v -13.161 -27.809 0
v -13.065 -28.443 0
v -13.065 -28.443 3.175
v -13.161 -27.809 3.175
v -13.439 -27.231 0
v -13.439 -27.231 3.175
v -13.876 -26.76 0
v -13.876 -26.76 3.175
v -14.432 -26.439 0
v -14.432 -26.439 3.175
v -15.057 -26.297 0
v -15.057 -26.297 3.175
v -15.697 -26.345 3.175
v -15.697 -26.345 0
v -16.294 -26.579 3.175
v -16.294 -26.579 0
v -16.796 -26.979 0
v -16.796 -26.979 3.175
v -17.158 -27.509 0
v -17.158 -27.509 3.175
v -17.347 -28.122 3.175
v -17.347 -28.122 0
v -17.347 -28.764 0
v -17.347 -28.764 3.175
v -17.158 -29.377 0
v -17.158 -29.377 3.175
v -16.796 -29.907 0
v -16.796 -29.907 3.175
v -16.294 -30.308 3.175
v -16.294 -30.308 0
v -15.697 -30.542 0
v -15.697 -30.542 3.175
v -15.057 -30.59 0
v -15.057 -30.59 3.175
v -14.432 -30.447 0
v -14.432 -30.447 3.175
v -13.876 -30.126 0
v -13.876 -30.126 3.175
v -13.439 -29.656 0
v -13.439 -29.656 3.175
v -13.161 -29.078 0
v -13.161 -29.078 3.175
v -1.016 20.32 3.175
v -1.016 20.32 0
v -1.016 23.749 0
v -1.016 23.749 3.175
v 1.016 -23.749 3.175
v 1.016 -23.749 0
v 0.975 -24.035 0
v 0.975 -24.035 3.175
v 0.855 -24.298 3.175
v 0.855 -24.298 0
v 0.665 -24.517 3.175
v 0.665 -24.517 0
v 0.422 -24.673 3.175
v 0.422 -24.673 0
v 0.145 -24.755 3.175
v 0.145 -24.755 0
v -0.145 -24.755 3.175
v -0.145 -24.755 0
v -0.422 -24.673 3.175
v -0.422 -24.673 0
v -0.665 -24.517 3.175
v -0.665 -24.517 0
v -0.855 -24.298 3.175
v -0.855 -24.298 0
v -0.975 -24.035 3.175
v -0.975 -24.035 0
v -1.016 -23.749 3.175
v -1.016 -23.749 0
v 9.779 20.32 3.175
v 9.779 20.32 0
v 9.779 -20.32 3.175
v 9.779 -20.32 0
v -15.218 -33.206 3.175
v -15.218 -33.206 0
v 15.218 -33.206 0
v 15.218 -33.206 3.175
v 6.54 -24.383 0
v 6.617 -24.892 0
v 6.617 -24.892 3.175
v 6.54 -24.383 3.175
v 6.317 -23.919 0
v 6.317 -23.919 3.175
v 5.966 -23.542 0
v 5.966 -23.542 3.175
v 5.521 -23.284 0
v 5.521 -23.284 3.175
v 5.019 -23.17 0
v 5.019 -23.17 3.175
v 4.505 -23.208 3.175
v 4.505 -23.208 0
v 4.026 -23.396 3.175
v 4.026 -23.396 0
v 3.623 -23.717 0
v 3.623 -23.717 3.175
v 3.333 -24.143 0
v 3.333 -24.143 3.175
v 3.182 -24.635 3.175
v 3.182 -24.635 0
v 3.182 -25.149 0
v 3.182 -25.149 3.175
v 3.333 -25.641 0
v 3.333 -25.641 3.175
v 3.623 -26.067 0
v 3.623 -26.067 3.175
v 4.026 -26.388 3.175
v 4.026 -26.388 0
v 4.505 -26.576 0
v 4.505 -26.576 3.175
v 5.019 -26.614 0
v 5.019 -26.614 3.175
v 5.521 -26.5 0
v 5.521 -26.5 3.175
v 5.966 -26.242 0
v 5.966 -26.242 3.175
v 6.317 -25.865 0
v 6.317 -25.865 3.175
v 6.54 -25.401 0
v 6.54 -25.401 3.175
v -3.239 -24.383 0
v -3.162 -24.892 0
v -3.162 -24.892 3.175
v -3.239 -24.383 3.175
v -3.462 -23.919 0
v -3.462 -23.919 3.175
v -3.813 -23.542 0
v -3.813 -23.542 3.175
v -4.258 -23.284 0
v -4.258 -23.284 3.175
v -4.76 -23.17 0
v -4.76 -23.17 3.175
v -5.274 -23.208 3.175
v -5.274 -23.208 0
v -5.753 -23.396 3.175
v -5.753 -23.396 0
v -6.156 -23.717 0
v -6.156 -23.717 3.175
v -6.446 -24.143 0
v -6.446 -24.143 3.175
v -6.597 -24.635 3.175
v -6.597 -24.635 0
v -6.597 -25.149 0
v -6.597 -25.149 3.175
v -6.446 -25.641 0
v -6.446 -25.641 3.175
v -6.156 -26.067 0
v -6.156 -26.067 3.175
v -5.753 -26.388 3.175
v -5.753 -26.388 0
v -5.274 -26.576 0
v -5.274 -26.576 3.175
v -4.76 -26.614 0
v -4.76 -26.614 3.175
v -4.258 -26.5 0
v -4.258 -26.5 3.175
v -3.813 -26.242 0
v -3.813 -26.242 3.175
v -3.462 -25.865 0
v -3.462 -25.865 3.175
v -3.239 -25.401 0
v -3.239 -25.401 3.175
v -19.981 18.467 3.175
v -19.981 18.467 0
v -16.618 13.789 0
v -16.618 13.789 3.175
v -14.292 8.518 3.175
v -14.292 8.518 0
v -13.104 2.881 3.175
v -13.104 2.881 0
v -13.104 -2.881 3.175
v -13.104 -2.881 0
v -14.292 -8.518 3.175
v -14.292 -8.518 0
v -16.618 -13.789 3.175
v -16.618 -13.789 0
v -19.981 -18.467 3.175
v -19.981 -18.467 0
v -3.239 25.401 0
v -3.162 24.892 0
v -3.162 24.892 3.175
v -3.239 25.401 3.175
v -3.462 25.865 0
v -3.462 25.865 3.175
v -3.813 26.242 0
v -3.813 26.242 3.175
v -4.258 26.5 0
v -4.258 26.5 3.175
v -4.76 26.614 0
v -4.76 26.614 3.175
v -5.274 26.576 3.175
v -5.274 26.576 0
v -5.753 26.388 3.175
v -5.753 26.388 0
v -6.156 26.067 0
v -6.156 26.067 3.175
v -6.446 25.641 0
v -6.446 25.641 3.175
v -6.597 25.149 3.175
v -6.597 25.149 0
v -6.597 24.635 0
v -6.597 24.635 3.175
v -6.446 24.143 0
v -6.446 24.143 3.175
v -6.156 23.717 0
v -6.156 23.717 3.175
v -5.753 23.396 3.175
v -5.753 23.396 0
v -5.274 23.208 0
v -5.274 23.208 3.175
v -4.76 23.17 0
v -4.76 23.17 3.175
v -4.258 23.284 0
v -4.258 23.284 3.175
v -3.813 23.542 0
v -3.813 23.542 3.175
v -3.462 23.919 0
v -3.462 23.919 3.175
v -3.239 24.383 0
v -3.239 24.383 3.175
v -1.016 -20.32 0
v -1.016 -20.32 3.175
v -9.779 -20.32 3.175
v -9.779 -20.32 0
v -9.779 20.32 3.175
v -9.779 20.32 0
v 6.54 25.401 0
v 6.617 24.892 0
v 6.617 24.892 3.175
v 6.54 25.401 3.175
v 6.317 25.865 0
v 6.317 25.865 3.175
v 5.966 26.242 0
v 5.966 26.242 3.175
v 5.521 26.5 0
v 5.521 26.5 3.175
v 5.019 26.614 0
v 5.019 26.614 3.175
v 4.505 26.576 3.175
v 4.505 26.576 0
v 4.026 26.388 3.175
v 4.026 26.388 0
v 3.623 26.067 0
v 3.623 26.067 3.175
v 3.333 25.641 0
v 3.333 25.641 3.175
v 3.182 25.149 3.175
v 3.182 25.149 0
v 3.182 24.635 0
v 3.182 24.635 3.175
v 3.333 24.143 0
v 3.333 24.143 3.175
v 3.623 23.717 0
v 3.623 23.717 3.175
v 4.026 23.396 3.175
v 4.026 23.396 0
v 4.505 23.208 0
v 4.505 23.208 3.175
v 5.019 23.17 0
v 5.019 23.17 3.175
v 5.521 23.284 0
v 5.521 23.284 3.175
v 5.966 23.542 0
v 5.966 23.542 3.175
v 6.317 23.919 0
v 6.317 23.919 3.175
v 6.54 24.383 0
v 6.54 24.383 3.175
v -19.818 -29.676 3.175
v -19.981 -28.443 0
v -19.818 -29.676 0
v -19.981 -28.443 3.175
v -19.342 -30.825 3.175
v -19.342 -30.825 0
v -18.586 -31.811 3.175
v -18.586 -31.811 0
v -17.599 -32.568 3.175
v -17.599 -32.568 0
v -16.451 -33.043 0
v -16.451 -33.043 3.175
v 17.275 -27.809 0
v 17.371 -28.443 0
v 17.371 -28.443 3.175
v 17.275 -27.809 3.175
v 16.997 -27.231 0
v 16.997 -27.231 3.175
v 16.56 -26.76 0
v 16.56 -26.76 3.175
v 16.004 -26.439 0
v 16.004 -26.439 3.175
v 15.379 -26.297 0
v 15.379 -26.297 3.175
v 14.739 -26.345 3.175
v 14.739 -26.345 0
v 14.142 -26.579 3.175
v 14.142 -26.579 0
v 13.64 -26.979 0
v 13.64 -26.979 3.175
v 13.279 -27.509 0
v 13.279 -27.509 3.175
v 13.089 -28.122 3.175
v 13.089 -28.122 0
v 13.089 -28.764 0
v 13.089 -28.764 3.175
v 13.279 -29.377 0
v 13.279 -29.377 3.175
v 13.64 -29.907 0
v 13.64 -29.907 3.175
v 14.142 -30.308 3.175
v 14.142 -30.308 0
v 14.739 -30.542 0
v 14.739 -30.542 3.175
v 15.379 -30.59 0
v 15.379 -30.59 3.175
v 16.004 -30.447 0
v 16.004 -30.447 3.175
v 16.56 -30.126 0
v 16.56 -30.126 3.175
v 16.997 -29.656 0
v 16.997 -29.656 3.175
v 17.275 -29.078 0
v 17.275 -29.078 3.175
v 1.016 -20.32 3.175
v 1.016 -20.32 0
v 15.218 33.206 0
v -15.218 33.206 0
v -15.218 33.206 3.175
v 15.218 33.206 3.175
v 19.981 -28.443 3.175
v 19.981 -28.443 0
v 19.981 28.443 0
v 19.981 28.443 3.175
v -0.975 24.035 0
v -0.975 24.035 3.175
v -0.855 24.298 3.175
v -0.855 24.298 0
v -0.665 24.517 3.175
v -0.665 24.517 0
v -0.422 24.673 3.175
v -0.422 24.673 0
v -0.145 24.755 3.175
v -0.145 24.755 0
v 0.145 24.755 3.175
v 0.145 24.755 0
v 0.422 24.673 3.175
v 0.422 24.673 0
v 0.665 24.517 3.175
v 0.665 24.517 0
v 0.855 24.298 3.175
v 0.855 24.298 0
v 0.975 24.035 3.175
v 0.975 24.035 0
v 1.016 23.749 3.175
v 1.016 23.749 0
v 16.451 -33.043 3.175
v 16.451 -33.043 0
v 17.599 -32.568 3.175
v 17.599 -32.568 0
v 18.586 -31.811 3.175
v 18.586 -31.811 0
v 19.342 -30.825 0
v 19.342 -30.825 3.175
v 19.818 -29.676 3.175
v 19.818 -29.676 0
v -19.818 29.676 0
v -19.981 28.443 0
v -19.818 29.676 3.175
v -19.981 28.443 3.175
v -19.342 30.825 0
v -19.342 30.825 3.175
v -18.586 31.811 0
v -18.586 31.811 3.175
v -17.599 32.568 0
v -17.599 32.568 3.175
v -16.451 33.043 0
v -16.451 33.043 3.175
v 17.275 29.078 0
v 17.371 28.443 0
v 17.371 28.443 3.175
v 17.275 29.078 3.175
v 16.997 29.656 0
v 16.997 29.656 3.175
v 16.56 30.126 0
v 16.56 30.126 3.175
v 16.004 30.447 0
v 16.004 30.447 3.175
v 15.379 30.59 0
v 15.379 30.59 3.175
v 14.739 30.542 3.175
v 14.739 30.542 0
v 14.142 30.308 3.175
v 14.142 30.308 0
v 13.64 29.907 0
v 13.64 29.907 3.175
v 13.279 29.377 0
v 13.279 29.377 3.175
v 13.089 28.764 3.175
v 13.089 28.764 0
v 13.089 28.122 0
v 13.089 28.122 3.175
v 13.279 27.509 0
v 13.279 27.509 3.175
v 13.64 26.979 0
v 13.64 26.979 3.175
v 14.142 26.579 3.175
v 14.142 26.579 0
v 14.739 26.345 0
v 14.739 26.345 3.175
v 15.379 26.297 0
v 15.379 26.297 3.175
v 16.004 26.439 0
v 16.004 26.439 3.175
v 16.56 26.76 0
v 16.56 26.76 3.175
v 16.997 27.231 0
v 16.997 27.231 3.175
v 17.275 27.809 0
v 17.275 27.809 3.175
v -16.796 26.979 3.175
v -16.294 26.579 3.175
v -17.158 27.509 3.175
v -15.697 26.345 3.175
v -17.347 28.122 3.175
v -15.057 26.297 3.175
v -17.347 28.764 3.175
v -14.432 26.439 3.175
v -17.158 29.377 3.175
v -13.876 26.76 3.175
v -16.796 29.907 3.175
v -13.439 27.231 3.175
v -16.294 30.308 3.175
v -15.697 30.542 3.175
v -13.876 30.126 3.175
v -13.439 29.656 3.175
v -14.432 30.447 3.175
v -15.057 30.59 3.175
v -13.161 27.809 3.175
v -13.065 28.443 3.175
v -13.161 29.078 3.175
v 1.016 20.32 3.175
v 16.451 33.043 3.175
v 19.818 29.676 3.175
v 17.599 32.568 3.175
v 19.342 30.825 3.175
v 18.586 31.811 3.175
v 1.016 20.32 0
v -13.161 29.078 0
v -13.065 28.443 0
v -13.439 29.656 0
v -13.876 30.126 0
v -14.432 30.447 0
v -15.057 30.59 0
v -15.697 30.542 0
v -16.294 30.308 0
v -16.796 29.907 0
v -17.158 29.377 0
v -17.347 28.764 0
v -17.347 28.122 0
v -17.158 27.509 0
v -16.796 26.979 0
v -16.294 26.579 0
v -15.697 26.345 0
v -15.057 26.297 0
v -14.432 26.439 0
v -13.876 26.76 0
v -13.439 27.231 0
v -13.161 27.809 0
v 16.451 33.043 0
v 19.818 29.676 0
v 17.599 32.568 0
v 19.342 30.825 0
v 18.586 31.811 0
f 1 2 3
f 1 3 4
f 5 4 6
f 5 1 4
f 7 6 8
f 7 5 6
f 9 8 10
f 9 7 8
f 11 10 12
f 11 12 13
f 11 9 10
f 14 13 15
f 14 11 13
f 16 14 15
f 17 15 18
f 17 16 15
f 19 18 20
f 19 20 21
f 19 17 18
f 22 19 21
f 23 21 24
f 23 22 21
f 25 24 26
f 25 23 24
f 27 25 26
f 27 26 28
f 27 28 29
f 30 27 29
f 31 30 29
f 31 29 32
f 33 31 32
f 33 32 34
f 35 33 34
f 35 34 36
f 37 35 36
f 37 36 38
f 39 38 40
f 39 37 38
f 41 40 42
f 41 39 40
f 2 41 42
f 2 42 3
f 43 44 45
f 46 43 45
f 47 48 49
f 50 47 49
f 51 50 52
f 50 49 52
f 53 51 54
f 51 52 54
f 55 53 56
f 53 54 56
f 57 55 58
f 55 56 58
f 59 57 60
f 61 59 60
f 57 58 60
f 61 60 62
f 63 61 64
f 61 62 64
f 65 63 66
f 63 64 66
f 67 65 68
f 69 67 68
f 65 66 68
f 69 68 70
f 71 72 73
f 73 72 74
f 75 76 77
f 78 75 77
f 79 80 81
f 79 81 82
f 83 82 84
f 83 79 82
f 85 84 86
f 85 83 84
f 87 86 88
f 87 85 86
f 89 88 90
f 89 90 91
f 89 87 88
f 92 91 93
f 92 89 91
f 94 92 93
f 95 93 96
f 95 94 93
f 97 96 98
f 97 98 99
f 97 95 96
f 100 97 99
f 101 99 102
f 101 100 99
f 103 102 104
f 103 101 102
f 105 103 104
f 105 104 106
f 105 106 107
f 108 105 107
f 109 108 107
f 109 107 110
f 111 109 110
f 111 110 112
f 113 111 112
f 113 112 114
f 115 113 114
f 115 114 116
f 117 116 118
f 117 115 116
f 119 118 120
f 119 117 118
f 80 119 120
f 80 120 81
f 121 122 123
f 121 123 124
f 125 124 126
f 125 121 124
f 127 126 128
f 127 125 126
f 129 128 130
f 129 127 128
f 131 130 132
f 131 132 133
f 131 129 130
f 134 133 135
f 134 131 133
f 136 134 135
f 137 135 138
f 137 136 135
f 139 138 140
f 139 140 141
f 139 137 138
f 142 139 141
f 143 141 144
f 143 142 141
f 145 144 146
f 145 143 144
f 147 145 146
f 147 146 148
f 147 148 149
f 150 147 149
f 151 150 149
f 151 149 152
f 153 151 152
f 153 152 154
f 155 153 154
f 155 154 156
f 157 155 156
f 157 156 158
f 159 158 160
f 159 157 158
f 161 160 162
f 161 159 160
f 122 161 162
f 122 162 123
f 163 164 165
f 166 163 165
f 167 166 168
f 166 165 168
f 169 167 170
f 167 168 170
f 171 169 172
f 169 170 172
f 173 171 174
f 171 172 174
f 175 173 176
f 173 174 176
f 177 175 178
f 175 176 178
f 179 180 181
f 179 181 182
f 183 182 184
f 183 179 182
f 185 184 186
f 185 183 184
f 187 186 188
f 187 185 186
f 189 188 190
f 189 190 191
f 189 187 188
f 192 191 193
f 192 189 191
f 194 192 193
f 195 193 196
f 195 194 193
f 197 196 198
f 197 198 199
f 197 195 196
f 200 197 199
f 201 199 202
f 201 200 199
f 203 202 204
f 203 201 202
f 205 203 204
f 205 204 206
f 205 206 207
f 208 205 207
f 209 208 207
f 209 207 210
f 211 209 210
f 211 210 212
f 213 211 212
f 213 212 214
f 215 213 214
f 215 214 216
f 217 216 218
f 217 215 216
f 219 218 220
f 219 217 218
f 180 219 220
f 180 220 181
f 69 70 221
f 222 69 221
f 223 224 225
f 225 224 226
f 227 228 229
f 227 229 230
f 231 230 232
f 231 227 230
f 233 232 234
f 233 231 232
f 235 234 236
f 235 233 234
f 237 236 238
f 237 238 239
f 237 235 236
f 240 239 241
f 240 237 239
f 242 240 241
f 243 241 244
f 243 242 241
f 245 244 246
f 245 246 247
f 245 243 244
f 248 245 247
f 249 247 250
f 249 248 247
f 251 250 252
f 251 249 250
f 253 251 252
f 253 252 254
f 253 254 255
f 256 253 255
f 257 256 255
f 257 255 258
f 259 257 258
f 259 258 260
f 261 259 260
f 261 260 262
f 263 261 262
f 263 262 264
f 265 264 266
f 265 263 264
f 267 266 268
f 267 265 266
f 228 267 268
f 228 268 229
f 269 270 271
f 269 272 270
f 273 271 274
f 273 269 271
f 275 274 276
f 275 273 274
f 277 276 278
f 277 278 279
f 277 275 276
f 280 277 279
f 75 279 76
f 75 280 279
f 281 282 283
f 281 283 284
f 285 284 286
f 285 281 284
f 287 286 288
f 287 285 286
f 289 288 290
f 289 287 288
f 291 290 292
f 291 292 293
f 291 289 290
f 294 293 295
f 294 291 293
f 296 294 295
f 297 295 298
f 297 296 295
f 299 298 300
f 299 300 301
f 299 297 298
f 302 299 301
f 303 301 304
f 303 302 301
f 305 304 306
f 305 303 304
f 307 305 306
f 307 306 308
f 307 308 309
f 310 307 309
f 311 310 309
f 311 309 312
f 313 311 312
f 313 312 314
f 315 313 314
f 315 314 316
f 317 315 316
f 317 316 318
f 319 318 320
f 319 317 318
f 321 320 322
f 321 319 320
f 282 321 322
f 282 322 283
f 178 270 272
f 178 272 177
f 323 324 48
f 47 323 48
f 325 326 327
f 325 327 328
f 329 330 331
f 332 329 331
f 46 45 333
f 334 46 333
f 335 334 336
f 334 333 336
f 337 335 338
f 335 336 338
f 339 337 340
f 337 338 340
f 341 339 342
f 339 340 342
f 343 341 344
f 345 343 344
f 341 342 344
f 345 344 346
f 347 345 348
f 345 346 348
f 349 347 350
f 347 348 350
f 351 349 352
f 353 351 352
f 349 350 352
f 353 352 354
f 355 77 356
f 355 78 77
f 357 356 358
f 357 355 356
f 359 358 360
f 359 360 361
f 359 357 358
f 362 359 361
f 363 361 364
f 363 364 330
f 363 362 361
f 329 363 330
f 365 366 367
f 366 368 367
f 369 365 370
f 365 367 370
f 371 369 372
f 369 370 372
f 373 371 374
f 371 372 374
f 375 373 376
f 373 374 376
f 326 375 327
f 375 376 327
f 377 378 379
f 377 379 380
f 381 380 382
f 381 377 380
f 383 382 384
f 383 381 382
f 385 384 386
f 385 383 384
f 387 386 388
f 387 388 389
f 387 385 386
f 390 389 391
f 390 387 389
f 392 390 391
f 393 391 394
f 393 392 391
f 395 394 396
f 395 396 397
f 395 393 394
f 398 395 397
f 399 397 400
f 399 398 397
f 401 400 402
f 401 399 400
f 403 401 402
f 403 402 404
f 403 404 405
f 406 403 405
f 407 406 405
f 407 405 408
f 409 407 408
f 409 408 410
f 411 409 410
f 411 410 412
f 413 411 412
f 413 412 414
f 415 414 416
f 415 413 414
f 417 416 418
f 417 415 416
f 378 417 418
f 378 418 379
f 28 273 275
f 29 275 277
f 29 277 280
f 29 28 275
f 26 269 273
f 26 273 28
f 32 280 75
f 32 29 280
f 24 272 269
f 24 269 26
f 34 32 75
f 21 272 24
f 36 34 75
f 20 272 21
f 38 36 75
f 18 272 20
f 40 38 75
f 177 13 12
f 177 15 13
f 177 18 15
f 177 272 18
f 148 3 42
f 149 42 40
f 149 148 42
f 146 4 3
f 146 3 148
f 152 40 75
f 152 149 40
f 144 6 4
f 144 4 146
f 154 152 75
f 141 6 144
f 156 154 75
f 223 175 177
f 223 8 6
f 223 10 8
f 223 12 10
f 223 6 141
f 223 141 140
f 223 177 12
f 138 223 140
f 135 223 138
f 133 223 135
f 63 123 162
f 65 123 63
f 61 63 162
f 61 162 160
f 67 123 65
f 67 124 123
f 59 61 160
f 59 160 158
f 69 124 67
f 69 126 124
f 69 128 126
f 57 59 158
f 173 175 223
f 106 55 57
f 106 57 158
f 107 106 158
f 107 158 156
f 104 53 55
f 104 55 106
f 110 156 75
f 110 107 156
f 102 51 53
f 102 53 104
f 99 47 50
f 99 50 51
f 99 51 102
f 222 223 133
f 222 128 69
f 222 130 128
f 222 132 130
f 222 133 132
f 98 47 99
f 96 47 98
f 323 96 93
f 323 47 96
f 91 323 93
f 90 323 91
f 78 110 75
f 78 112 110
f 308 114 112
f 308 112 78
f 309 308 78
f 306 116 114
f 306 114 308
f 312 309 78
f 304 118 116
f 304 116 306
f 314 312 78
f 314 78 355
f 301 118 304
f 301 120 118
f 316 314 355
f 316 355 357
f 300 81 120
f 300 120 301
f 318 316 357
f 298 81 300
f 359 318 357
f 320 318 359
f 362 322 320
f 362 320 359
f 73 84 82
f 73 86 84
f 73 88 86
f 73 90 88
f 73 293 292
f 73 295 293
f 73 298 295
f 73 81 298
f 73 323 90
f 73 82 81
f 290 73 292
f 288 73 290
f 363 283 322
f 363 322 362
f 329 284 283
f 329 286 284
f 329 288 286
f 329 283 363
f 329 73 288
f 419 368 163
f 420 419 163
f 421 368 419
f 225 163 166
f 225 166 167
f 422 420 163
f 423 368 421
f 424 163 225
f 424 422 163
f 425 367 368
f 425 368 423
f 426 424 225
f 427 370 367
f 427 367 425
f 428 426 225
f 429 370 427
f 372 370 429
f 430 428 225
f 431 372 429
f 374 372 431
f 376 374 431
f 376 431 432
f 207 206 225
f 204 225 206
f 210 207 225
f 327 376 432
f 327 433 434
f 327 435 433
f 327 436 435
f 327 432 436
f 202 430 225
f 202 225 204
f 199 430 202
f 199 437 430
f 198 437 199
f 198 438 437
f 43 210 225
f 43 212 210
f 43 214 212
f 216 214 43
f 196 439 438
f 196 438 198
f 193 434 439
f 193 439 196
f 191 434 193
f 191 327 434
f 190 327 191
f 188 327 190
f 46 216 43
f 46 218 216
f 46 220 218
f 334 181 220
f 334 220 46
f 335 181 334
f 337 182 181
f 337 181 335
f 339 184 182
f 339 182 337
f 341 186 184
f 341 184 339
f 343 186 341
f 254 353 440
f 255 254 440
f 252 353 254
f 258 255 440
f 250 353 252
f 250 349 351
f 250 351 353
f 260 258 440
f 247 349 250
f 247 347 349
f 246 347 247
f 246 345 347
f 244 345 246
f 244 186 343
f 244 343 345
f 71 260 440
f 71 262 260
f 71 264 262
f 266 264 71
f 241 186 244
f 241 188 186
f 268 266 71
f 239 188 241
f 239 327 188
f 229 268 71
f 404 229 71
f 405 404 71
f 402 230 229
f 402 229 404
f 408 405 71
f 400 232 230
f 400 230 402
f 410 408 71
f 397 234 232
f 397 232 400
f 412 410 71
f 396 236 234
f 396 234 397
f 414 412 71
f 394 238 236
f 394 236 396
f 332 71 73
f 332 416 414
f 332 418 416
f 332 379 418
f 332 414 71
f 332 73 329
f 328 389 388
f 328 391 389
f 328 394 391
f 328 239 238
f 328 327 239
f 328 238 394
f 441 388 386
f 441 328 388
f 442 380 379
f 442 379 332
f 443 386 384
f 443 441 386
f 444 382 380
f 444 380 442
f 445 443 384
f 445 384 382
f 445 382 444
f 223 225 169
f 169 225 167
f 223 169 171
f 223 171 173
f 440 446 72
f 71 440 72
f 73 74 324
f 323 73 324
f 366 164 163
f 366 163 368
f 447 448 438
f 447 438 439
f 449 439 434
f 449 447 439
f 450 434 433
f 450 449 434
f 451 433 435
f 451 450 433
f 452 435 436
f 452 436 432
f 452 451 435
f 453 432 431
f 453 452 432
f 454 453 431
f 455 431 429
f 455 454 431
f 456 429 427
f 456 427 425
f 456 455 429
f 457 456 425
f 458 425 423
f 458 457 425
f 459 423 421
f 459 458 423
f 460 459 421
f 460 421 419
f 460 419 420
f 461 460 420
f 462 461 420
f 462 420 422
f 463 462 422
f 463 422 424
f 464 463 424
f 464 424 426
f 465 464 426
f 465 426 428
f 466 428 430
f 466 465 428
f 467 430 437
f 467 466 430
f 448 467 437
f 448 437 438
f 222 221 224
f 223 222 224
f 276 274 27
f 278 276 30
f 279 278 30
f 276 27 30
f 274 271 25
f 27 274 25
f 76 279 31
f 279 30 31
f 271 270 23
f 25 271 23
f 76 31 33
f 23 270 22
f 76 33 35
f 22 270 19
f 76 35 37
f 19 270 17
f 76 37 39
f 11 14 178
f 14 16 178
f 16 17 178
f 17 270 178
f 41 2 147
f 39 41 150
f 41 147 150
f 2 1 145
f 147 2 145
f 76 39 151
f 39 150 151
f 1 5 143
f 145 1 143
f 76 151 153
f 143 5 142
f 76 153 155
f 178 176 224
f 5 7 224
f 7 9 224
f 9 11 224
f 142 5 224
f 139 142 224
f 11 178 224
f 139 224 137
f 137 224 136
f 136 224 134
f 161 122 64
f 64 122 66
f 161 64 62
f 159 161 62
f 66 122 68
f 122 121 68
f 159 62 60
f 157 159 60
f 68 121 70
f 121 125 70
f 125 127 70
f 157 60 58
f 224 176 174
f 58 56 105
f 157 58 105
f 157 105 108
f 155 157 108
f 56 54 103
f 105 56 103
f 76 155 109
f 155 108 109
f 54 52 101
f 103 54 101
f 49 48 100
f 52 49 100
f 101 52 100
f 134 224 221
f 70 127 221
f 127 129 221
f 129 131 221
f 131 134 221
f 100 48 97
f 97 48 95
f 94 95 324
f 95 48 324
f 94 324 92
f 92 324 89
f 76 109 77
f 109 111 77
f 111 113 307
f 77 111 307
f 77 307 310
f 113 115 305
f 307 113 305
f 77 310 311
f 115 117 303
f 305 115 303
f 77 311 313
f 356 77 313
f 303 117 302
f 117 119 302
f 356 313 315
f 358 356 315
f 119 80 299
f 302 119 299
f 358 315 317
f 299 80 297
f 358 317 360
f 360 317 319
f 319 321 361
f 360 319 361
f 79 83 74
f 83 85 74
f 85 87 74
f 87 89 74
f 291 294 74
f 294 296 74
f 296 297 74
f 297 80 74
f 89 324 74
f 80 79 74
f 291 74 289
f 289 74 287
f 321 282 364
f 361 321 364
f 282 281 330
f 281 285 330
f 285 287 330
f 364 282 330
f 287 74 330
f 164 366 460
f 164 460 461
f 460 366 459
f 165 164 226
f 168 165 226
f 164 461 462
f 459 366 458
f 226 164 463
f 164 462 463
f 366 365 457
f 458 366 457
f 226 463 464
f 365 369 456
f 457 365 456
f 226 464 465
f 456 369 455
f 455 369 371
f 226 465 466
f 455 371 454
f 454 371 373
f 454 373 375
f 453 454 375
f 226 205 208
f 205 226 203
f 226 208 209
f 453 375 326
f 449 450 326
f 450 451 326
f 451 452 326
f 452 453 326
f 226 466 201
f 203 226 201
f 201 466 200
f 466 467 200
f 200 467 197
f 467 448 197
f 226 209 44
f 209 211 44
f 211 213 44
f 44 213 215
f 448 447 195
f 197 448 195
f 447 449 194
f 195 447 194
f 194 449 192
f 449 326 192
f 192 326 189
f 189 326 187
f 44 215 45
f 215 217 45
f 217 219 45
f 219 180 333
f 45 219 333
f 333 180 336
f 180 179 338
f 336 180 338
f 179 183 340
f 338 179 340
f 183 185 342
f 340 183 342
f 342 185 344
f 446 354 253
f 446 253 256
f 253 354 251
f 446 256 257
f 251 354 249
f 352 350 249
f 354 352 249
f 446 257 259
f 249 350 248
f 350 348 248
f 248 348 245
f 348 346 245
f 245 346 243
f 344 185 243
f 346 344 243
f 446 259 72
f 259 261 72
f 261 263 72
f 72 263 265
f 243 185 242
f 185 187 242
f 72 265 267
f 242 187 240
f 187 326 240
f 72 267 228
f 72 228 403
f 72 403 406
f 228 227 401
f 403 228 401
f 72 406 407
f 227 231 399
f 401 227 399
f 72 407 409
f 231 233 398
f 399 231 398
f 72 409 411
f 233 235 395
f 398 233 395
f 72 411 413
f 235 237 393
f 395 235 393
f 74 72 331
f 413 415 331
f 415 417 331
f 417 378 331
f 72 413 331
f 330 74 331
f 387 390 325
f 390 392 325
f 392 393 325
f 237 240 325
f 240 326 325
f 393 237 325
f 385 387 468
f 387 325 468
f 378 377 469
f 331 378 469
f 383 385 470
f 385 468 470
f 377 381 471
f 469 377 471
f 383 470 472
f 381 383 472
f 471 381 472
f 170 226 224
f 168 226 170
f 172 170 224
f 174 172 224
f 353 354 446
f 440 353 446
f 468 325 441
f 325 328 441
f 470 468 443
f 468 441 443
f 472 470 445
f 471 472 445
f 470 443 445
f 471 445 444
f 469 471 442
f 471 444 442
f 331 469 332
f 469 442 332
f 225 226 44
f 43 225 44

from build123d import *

# Parameters (mm, degrees)
F0_W     = 39.961066
F0_H     = 66.41153
F0_R     = 2.15265
F0_R_2   = 1.7272
F1_DEPTH = 3.175
F2_R     = 4.7625
F4_DEPTH = 3.175


with BuildPart() as f1:
    # F0 (on Top) → F1 (new body)
    with BuildSketch(Plane.XY):
        Rectangle(F0_W, F0_H)
        with Locations((-15.218033, -28.443265)):
            Circle(F0_R, mode=Mode.SUBTRACT)
        with Locations((-4.8895, -24.892)):
            Circle(F0_R_2, mode=Mode.SUBTRACT)
        with Locations((4.8895, -24.892)):
            Circle(F0_R_2, mode=Mode.SUBTRACT)
        with Locations((15.218033, -28.443265)):
            Circle(F0_R, mode=Mode.SUBTRACT)
        with Locations((-15.218033, 28.443265)):
            Circle(F0_R, mode=Mode.SUBTRACT)
        with Locations((-4.8895, 24.892)):
            Circle(F0_R_2, mode=Mode.SUBTRACT)
        with BuildLine():
            Line((-1.016, -20.32), (-9.779, -20.32))
            Line((-9.779, -20.32), (-9.779, 20.32))
            Line((-9.779, 20.32), (-1.016, 20.32))
            Line((-1.016, 20.32), (-1.016, 23.749))
            ThreePointArc((-1.016, 23.749), (0, 24.765), (1.016, 23.749))
            Line((1.016, 23.749), (1.016, 20.32))
            Line((1.016, 20.32), (9.779, 20.32))
            Line((9.779, 20.32), (9.779, -20.32))
            Line((9.779, -20.32), (1.016, -20.32))
            Line((1.016, -20.32), (1.016, -23.749))
            ThreePointArc((1.016, -23.749), (0, -24.765), (-1.016, -23.749))
            Line((-1.016, -23.749), (-1.016, -20.32))
        make_face(mode=Mode.SUBTRACT)
        with Locations((4.8895, 24.892)):
            Circle(F0_R_2, mode=Mode.SUBTRACT)
        with Locations((15.218033, 28.443265)):
            Circle(F0_R, mode=Mode.SUBTRACT)
    extrude(amount=F1_DEPTH)

    # F2
    f2_edges = [f1.edges().sort_by_distance(p)[0] for p in [
        (19.980533, 33.205765, 1.5875),
        (19.980533, -33.205765, 1.5875),
        (-19.980533, 33.205765, 1.5875),
        (-19.980533, -33.205765, 1.5875),
    ]]
    fillet(f2_edges, radius=F2_R)

    # F3 (on face) → F4 (cut, through all)
    with BuildSketch(Plane(origin=(0, 0, 0), x_dir=(1, 0, 0), z_dir=(0, 0, -1))):
        with BuildLine():
            Line((-19.980533, 18.467257), (-19.980533, -18.467257))
            ThreePointArc((-19.980533, -18.467257), (-12.954, 0), (-19.980533, 18.467257))
        make_face()
    extrude(amount=-F4_DEPTH, mode=Mode.SUBTRACT)


solid = f1.part
